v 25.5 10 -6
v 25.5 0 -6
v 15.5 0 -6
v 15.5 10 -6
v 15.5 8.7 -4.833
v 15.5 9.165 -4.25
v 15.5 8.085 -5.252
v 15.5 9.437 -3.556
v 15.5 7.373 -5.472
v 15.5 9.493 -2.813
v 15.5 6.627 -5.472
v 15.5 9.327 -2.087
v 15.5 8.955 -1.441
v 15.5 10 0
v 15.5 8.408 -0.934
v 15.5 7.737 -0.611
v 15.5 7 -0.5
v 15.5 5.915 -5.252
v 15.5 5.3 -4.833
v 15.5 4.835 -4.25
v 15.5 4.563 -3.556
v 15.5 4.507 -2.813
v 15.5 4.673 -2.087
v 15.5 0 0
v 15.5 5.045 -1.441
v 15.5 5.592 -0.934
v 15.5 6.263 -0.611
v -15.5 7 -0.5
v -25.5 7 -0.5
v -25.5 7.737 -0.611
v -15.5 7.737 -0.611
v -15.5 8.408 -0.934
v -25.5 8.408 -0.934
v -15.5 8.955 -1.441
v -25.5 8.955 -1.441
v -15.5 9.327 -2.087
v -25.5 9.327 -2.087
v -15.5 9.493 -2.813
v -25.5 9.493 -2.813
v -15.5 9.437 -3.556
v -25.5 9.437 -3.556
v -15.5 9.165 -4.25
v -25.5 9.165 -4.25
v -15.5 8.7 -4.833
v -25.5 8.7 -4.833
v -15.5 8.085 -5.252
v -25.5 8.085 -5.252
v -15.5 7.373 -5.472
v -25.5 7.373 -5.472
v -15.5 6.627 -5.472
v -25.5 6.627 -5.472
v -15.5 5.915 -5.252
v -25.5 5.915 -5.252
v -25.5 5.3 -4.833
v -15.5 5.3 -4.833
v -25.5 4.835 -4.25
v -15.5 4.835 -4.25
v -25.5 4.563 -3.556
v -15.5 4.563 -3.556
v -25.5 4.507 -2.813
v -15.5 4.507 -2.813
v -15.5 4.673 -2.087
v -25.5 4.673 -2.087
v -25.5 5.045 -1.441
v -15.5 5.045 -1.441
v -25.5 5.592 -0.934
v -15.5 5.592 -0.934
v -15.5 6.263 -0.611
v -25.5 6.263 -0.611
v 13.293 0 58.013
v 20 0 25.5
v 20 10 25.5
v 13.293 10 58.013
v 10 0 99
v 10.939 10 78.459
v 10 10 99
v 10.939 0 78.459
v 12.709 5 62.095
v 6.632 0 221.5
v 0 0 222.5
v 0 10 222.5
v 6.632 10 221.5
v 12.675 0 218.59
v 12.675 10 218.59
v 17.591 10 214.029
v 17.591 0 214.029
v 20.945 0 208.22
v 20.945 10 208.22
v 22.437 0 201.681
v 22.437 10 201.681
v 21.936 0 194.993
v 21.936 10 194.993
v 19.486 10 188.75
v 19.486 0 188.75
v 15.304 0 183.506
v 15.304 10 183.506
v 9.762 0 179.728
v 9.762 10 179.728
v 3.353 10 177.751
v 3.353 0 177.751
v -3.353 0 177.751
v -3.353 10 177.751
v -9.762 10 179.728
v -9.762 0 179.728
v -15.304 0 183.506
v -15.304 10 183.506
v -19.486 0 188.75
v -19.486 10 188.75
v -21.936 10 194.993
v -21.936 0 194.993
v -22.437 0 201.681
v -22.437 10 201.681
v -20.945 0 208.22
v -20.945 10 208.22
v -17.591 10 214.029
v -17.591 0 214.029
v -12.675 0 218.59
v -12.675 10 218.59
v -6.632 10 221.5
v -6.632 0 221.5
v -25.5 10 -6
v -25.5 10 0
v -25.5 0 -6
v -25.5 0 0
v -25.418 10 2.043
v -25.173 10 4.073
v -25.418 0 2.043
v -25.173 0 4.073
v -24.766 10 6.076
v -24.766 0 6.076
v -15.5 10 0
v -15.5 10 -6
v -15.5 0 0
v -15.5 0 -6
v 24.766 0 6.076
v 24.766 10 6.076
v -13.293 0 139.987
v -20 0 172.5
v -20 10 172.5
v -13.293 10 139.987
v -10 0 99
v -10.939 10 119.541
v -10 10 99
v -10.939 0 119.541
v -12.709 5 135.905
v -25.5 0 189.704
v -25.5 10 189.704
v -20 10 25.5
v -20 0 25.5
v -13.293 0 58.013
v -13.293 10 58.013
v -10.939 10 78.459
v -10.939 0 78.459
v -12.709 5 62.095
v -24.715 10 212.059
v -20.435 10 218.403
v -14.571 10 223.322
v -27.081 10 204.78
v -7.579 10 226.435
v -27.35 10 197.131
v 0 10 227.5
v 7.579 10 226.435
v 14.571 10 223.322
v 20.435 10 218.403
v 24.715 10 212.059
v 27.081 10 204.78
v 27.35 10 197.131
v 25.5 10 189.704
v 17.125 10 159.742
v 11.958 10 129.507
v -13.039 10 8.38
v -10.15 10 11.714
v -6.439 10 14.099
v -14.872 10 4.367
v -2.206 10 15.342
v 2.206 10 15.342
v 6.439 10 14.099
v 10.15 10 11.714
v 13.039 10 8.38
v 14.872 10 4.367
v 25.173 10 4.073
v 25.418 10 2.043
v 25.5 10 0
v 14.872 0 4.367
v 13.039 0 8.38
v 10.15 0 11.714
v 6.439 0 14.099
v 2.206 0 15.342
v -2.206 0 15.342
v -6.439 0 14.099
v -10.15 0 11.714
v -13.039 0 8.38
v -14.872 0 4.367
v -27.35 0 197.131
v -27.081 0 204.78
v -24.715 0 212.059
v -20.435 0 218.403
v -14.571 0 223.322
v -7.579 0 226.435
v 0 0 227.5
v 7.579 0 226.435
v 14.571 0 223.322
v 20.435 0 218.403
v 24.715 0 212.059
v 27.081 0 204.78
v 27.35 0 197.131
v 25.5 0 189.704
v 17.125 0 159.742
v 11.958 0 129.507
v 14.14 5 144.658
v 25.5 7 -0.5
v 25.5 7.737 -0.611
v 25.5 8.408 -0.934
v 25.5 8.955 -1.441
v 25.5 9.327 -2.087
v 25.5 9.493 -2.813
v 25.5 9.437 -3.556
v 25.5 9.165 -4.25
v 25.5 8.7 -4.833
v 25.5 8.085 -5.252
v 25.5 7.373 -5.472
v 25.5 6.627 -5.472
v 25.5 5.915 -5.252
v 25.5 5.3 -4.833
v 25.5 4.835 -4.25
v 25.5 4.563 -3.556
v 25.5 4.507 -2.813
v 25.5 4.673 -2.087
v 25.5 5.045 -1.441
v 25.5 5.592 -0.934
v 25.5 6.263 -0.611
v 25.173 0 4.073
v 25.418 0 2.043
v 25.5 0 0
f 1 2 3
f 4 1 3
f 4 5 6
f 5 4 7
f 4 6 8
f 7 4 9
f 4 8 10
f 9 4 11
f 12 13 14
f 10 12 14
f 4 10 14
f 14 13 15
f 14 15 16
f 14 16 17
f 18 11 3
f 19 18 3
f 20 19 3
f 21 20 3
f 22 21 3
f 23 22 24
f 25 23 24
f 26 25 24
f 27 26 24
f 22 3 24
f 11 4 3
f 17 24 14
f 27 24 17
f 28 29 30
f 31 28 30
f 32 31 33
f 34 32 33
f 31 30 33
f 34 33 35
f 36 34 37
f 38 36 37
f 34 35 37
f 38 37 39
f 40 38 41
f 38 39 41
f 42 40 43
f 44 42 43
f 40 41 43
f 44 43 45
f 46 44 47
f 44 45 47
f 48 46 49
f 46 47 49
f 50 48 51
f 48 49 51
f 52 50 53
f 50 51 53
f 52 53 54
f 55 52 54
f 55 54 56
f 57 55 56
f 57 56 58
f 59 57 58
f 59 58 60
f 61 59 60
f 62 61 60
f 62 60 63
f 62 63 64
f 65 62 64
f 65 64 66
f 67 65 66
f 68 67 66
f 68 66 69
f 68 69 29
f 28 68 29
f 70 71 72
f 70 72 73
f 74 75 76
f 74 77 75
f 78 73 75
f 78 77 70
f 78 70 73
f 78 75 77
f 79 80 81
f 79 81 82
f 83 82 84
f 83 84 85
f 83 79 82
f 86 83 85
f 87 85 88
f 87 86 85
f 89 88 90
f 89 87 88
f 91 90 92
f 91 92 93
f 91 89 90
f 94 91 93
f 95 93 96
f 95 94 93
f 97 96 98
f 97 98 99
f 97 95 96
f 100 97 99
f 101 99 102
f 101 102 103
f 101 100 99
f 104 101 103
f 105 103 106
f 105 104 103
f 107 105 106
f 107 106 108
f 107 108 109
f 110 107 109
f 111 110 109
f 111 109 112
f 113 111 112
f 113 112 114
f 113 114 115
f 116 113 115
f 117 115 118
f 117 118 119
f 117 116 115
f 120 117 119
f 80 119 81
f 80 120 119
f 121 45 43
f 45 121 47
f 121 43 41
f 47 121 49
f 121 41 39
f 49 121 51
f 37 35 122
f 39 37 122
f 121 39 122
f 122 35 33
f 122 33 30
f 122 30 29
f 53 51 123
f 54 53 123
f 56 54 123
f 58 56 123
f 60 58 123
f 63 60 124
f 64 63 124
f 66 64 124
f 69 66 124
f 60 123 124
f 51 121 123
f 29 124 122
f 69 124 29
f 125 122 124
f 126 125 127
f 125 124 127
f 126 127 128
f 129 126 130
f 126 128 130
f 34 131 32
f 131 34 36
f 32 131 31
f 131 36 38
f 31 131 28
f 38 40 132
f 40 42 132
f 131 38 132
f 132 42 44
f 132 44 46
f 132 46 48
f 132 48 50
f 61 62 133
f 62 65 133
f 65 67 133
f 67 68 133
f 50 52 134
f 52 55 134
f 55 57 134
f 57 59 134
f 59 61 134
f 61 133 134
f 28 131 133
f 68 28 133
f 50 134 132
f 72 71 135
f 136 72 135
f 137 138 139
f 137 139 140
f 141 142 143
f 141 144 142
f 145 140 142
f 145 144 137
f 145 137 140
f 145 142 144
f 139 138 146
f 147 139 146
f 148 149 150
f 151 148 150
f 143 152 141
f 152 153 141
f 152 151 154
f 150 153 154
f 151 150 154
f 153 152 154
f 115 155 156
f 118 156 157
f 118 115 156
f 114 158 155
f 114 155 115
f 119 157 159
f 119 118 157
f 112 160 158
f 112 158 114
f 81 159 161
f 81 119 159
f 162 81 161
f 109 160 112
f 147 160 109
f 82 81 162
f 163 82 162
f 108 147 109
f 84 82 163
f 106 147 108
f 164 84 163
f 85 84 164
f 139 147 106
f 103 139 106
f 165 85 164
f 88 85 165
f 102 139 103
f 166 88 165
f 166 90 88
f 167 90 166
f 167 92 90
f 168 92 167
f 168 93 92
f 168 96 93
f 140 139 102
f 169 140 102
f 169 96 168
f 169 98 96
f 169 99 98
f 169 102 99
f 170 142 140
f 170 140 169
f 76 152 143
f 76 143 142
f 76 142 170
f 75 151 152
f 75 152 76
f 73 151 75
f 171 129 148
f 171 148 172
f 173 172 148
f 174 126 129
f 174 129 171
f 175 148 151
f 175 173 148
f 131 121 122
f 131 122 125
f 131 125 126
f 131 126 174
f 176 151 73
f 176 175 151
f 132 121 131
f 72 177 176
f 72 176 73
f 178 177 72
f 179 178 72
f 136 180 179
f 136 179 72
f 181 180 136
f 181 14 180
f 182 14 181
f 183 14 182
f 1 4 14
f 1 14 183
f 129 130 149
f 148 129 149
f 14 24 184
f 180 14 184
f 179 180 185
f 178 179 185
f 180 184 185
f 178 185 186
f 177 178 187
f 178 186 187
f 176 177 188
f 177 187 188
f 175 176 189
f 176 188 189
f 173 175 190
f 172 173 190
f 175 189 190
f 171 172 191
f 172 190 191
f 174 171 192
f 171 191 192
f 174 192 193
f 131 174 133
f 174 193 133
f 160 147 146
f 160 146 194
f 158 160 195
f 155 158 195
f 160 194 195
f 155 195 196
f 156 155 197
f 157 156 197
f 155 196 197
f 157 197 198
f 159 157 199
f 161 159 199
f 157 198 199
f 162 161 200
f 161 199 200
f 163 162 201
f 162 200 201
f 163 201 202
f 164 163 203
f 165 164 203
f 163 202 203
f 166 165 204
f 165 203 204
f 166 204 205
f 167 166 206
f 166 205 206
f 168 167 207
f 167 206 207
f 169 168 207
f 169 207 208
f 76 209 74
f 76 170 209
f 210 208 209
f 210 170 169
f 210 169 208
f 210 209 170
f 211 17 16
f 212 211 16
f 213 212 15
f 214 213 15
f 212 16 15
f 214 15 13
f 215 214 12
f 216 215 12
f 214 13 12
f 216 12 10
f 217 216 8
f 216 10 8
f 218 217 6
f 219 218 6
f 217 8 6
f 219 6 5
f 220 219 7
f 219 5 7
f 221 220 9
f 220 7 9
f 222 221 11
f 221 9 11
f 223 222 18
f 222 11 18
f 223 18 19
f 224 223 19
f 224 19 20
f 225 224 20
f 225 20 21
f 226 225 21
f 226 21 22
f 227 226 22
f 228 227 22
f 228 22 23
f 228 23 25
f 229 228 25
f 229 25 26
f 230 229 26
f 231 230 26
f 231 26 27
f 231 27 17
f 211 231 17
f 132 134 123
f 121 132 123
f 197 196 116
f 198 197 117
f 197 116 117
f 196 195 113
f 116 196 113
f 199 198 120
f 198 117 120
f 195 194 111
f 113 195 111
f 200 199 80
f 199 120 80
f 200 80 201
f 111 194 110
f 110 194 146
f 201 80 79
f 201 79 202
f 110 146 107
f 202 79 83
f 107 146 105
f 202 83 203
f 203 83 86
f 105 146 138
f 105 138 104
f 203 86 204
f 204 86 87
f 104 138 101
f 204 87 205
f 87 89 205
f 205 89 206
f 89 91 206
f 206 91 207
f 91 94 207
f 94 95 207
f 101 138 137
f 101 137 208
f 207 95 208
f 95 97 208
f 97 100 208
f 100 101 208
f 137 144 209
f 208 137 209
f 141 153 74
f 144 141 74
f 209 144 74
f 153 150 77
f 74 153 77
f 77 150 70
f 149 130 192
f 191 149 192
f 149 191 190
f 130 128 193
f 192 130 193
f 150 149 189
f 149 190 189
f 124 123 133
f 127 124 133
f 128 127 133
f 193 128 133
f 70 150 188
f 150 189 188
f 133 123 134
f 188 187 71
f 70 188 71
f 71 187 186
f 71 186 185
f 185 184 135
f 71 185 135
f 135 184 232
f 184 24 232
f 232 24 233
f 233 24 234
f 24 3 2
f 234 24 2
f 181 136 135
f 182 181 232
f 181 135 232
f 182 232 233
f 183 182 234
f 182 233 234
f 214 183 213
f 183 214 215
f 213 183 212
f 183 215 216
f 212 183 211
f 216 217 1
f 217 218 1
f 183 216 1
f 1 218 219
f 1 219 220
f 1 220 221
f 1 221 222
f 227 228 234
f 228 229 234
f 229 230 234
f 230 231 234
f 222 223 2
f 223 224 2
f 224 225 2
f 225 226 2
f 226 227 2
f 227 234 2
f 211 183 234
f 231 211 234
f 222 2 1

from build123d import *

# Parameters (mm, degrees)
BOSS_EXTRUDE1_DEPTH   = 10
SKETCH1_R             = 22.5
BOSS_EXTRUDE1_2_DEPTH = 10
BOSS_EXTRUDE6_DEPTH   = 10
SKETCH4_R             = 2.5
CUT_EXTRUDE1_DEPTH    = 234.806009457


with BuildPart() as part:
    # Sketch1 → Boss-Extrude1 (new body)
    with BuildSketch(Plane(origin=(0, 0, 0), x_dir=(1, 0, 0), z_dir=(0, 1, 0))):
        with BuildLine():
            Line((-25.5, 6), (-25.5, 0))
            ThreePointArc((-25.5, 0), (-25.315717118, -3.06014163), (-24.765532016, -6.076053321))
            Line((-24.765532016, -6.076053321), (-20, -25.5))
            add(Edge.make_bspline(
                [(-20, -25.5), (-10.418058305, -61.939732527), (-10, -99)],
                knots=[0, 0, 0, 0.916388339, 0.916388339, 0.916388339], degree=2))
            Line((-10, -99), (0, -99))
            Line((0, -99), (0, -172.5))
            Line((0, -172.5), (10, -172.5))
            Line((10, -172.5), (10, -105.767954903))
            add(Edge.make_bspline(
                [(10, -99), (9.961856183, -102.381394532), (10, -105.767954903)],
                knots=[0.916388339, 0.916388339, 0.916388339, 1, 1, 1], degree=2))
            add(Edge.make_bspline(
                [(20, -25.5), (10.418058305, -61.939732527), (10, -99)],
                knots=[0, 0, 0, 0.916388339, 0.916388339, 0.916388339], degree=2))
            Line((20, -25.5), (24.765532016, -6.076053321))
            ThreePointArc((24.765532016, -6.076053321), (25.315717118, -3.06014163), (25.5, 0))
            Line((25.5, 0), (25.5, 6))
            Line((25.5, 6), (15.5, 6))
            Line((15.5, 6), (15.5, 0))
            ThreePointArc((15.5, 0), (0, -15.5), (-15.5, 0))
            Line((-15.5, 0), (-15.5, 6))
            Line((-15.5, 6), (-25.5, 6))
        make_face()
    extrude(amount=BOSS_EXTRUDE1_DEPTH)



with BuildPart() as body_2:
    # Sketch1 → Boss-Extrude1 2 (new body)
    with BuildSketch(Plane(origin=(0, 0, 0), x_dir=(1, 0, 0), z_dir=(0, 1, 0))):
        with BuildLine():
            Line((-10, -172.5), (-10, -99))
            add(Edge.make_bspline(
                [(-20, -172.5), (-10.418058305, -136.060267473), (-10, -99)],
                knots=[0, 0, 0, 0.916388339, 0.916388339, 0.916388339], degree=2))
            Line((-20, -172.5), (-25.5, -189.704369859))
            ThreePointArc((-25.5, -189.704369859), (15.380509925, -222.796708412), (0, -172.5))
            Line((0, -172.5), (-10, -172.5))
        make_face()
        with Locations(Location((0, -200, 0), (0, 0, 270))):
            Circle(SKETCH1_R, mode=Mode.SUBTRACT)
    extrude(amount=BOSS_EXTRUDE1_2_DEPTH)


with BuildPart() as part_1:
    add(part.part)

    add(body_2.part)  # Boss-Extrude6 merges body 2
    # Sketch3 → Boss-Extrude6 (add)
    with BuildSketch(Plane(origin=(0, 10, 0), x_dir=(1, 0, 0), z_dir=(0, 1, 0))):
        with BuildLine():
            ThreePointArc((0, -172.5), (5.087835239, -172.974753792), (10, -174.382623085))
            Line((10, -174.382623085), (10, -99))
            Line((10, -99), (-10, -99))
            Line((-10, -99), (-10, -172.5))
            Line((-10, -172.5), (0, -172.5))
        make_face()
        with BuildLine():
            Line((10, -99), (10, -174.382623085))
            ThreePointArc((10, -174.382623085), (19.332653234, -180.442430648), (25.5, -189.704369859))
            add(Edge.make_bspline(
                [(25.5, -189.704369859), (10.530956194, -144.964559023), (10, -99)],
                knots=[0, 0, 0, 0.931489523, 0.931489523, 0.931489523], degree=2))
        make_face()
    extrude(amount=-BOSS_EXTRUDE6_DEPTH)

    # Sketch4 → Cut-Extrude1 (cut, through all)
    with BuildSketch(Plane.ZY.offset(25.5)):
        with Locations((-3, 7)):
            Circle(SKETCH4_R)
    extrude(amount=-CUT_EXTRUDE1_DEPTH, mode=Mode.SUBTRACT)


solid = part_1.part
